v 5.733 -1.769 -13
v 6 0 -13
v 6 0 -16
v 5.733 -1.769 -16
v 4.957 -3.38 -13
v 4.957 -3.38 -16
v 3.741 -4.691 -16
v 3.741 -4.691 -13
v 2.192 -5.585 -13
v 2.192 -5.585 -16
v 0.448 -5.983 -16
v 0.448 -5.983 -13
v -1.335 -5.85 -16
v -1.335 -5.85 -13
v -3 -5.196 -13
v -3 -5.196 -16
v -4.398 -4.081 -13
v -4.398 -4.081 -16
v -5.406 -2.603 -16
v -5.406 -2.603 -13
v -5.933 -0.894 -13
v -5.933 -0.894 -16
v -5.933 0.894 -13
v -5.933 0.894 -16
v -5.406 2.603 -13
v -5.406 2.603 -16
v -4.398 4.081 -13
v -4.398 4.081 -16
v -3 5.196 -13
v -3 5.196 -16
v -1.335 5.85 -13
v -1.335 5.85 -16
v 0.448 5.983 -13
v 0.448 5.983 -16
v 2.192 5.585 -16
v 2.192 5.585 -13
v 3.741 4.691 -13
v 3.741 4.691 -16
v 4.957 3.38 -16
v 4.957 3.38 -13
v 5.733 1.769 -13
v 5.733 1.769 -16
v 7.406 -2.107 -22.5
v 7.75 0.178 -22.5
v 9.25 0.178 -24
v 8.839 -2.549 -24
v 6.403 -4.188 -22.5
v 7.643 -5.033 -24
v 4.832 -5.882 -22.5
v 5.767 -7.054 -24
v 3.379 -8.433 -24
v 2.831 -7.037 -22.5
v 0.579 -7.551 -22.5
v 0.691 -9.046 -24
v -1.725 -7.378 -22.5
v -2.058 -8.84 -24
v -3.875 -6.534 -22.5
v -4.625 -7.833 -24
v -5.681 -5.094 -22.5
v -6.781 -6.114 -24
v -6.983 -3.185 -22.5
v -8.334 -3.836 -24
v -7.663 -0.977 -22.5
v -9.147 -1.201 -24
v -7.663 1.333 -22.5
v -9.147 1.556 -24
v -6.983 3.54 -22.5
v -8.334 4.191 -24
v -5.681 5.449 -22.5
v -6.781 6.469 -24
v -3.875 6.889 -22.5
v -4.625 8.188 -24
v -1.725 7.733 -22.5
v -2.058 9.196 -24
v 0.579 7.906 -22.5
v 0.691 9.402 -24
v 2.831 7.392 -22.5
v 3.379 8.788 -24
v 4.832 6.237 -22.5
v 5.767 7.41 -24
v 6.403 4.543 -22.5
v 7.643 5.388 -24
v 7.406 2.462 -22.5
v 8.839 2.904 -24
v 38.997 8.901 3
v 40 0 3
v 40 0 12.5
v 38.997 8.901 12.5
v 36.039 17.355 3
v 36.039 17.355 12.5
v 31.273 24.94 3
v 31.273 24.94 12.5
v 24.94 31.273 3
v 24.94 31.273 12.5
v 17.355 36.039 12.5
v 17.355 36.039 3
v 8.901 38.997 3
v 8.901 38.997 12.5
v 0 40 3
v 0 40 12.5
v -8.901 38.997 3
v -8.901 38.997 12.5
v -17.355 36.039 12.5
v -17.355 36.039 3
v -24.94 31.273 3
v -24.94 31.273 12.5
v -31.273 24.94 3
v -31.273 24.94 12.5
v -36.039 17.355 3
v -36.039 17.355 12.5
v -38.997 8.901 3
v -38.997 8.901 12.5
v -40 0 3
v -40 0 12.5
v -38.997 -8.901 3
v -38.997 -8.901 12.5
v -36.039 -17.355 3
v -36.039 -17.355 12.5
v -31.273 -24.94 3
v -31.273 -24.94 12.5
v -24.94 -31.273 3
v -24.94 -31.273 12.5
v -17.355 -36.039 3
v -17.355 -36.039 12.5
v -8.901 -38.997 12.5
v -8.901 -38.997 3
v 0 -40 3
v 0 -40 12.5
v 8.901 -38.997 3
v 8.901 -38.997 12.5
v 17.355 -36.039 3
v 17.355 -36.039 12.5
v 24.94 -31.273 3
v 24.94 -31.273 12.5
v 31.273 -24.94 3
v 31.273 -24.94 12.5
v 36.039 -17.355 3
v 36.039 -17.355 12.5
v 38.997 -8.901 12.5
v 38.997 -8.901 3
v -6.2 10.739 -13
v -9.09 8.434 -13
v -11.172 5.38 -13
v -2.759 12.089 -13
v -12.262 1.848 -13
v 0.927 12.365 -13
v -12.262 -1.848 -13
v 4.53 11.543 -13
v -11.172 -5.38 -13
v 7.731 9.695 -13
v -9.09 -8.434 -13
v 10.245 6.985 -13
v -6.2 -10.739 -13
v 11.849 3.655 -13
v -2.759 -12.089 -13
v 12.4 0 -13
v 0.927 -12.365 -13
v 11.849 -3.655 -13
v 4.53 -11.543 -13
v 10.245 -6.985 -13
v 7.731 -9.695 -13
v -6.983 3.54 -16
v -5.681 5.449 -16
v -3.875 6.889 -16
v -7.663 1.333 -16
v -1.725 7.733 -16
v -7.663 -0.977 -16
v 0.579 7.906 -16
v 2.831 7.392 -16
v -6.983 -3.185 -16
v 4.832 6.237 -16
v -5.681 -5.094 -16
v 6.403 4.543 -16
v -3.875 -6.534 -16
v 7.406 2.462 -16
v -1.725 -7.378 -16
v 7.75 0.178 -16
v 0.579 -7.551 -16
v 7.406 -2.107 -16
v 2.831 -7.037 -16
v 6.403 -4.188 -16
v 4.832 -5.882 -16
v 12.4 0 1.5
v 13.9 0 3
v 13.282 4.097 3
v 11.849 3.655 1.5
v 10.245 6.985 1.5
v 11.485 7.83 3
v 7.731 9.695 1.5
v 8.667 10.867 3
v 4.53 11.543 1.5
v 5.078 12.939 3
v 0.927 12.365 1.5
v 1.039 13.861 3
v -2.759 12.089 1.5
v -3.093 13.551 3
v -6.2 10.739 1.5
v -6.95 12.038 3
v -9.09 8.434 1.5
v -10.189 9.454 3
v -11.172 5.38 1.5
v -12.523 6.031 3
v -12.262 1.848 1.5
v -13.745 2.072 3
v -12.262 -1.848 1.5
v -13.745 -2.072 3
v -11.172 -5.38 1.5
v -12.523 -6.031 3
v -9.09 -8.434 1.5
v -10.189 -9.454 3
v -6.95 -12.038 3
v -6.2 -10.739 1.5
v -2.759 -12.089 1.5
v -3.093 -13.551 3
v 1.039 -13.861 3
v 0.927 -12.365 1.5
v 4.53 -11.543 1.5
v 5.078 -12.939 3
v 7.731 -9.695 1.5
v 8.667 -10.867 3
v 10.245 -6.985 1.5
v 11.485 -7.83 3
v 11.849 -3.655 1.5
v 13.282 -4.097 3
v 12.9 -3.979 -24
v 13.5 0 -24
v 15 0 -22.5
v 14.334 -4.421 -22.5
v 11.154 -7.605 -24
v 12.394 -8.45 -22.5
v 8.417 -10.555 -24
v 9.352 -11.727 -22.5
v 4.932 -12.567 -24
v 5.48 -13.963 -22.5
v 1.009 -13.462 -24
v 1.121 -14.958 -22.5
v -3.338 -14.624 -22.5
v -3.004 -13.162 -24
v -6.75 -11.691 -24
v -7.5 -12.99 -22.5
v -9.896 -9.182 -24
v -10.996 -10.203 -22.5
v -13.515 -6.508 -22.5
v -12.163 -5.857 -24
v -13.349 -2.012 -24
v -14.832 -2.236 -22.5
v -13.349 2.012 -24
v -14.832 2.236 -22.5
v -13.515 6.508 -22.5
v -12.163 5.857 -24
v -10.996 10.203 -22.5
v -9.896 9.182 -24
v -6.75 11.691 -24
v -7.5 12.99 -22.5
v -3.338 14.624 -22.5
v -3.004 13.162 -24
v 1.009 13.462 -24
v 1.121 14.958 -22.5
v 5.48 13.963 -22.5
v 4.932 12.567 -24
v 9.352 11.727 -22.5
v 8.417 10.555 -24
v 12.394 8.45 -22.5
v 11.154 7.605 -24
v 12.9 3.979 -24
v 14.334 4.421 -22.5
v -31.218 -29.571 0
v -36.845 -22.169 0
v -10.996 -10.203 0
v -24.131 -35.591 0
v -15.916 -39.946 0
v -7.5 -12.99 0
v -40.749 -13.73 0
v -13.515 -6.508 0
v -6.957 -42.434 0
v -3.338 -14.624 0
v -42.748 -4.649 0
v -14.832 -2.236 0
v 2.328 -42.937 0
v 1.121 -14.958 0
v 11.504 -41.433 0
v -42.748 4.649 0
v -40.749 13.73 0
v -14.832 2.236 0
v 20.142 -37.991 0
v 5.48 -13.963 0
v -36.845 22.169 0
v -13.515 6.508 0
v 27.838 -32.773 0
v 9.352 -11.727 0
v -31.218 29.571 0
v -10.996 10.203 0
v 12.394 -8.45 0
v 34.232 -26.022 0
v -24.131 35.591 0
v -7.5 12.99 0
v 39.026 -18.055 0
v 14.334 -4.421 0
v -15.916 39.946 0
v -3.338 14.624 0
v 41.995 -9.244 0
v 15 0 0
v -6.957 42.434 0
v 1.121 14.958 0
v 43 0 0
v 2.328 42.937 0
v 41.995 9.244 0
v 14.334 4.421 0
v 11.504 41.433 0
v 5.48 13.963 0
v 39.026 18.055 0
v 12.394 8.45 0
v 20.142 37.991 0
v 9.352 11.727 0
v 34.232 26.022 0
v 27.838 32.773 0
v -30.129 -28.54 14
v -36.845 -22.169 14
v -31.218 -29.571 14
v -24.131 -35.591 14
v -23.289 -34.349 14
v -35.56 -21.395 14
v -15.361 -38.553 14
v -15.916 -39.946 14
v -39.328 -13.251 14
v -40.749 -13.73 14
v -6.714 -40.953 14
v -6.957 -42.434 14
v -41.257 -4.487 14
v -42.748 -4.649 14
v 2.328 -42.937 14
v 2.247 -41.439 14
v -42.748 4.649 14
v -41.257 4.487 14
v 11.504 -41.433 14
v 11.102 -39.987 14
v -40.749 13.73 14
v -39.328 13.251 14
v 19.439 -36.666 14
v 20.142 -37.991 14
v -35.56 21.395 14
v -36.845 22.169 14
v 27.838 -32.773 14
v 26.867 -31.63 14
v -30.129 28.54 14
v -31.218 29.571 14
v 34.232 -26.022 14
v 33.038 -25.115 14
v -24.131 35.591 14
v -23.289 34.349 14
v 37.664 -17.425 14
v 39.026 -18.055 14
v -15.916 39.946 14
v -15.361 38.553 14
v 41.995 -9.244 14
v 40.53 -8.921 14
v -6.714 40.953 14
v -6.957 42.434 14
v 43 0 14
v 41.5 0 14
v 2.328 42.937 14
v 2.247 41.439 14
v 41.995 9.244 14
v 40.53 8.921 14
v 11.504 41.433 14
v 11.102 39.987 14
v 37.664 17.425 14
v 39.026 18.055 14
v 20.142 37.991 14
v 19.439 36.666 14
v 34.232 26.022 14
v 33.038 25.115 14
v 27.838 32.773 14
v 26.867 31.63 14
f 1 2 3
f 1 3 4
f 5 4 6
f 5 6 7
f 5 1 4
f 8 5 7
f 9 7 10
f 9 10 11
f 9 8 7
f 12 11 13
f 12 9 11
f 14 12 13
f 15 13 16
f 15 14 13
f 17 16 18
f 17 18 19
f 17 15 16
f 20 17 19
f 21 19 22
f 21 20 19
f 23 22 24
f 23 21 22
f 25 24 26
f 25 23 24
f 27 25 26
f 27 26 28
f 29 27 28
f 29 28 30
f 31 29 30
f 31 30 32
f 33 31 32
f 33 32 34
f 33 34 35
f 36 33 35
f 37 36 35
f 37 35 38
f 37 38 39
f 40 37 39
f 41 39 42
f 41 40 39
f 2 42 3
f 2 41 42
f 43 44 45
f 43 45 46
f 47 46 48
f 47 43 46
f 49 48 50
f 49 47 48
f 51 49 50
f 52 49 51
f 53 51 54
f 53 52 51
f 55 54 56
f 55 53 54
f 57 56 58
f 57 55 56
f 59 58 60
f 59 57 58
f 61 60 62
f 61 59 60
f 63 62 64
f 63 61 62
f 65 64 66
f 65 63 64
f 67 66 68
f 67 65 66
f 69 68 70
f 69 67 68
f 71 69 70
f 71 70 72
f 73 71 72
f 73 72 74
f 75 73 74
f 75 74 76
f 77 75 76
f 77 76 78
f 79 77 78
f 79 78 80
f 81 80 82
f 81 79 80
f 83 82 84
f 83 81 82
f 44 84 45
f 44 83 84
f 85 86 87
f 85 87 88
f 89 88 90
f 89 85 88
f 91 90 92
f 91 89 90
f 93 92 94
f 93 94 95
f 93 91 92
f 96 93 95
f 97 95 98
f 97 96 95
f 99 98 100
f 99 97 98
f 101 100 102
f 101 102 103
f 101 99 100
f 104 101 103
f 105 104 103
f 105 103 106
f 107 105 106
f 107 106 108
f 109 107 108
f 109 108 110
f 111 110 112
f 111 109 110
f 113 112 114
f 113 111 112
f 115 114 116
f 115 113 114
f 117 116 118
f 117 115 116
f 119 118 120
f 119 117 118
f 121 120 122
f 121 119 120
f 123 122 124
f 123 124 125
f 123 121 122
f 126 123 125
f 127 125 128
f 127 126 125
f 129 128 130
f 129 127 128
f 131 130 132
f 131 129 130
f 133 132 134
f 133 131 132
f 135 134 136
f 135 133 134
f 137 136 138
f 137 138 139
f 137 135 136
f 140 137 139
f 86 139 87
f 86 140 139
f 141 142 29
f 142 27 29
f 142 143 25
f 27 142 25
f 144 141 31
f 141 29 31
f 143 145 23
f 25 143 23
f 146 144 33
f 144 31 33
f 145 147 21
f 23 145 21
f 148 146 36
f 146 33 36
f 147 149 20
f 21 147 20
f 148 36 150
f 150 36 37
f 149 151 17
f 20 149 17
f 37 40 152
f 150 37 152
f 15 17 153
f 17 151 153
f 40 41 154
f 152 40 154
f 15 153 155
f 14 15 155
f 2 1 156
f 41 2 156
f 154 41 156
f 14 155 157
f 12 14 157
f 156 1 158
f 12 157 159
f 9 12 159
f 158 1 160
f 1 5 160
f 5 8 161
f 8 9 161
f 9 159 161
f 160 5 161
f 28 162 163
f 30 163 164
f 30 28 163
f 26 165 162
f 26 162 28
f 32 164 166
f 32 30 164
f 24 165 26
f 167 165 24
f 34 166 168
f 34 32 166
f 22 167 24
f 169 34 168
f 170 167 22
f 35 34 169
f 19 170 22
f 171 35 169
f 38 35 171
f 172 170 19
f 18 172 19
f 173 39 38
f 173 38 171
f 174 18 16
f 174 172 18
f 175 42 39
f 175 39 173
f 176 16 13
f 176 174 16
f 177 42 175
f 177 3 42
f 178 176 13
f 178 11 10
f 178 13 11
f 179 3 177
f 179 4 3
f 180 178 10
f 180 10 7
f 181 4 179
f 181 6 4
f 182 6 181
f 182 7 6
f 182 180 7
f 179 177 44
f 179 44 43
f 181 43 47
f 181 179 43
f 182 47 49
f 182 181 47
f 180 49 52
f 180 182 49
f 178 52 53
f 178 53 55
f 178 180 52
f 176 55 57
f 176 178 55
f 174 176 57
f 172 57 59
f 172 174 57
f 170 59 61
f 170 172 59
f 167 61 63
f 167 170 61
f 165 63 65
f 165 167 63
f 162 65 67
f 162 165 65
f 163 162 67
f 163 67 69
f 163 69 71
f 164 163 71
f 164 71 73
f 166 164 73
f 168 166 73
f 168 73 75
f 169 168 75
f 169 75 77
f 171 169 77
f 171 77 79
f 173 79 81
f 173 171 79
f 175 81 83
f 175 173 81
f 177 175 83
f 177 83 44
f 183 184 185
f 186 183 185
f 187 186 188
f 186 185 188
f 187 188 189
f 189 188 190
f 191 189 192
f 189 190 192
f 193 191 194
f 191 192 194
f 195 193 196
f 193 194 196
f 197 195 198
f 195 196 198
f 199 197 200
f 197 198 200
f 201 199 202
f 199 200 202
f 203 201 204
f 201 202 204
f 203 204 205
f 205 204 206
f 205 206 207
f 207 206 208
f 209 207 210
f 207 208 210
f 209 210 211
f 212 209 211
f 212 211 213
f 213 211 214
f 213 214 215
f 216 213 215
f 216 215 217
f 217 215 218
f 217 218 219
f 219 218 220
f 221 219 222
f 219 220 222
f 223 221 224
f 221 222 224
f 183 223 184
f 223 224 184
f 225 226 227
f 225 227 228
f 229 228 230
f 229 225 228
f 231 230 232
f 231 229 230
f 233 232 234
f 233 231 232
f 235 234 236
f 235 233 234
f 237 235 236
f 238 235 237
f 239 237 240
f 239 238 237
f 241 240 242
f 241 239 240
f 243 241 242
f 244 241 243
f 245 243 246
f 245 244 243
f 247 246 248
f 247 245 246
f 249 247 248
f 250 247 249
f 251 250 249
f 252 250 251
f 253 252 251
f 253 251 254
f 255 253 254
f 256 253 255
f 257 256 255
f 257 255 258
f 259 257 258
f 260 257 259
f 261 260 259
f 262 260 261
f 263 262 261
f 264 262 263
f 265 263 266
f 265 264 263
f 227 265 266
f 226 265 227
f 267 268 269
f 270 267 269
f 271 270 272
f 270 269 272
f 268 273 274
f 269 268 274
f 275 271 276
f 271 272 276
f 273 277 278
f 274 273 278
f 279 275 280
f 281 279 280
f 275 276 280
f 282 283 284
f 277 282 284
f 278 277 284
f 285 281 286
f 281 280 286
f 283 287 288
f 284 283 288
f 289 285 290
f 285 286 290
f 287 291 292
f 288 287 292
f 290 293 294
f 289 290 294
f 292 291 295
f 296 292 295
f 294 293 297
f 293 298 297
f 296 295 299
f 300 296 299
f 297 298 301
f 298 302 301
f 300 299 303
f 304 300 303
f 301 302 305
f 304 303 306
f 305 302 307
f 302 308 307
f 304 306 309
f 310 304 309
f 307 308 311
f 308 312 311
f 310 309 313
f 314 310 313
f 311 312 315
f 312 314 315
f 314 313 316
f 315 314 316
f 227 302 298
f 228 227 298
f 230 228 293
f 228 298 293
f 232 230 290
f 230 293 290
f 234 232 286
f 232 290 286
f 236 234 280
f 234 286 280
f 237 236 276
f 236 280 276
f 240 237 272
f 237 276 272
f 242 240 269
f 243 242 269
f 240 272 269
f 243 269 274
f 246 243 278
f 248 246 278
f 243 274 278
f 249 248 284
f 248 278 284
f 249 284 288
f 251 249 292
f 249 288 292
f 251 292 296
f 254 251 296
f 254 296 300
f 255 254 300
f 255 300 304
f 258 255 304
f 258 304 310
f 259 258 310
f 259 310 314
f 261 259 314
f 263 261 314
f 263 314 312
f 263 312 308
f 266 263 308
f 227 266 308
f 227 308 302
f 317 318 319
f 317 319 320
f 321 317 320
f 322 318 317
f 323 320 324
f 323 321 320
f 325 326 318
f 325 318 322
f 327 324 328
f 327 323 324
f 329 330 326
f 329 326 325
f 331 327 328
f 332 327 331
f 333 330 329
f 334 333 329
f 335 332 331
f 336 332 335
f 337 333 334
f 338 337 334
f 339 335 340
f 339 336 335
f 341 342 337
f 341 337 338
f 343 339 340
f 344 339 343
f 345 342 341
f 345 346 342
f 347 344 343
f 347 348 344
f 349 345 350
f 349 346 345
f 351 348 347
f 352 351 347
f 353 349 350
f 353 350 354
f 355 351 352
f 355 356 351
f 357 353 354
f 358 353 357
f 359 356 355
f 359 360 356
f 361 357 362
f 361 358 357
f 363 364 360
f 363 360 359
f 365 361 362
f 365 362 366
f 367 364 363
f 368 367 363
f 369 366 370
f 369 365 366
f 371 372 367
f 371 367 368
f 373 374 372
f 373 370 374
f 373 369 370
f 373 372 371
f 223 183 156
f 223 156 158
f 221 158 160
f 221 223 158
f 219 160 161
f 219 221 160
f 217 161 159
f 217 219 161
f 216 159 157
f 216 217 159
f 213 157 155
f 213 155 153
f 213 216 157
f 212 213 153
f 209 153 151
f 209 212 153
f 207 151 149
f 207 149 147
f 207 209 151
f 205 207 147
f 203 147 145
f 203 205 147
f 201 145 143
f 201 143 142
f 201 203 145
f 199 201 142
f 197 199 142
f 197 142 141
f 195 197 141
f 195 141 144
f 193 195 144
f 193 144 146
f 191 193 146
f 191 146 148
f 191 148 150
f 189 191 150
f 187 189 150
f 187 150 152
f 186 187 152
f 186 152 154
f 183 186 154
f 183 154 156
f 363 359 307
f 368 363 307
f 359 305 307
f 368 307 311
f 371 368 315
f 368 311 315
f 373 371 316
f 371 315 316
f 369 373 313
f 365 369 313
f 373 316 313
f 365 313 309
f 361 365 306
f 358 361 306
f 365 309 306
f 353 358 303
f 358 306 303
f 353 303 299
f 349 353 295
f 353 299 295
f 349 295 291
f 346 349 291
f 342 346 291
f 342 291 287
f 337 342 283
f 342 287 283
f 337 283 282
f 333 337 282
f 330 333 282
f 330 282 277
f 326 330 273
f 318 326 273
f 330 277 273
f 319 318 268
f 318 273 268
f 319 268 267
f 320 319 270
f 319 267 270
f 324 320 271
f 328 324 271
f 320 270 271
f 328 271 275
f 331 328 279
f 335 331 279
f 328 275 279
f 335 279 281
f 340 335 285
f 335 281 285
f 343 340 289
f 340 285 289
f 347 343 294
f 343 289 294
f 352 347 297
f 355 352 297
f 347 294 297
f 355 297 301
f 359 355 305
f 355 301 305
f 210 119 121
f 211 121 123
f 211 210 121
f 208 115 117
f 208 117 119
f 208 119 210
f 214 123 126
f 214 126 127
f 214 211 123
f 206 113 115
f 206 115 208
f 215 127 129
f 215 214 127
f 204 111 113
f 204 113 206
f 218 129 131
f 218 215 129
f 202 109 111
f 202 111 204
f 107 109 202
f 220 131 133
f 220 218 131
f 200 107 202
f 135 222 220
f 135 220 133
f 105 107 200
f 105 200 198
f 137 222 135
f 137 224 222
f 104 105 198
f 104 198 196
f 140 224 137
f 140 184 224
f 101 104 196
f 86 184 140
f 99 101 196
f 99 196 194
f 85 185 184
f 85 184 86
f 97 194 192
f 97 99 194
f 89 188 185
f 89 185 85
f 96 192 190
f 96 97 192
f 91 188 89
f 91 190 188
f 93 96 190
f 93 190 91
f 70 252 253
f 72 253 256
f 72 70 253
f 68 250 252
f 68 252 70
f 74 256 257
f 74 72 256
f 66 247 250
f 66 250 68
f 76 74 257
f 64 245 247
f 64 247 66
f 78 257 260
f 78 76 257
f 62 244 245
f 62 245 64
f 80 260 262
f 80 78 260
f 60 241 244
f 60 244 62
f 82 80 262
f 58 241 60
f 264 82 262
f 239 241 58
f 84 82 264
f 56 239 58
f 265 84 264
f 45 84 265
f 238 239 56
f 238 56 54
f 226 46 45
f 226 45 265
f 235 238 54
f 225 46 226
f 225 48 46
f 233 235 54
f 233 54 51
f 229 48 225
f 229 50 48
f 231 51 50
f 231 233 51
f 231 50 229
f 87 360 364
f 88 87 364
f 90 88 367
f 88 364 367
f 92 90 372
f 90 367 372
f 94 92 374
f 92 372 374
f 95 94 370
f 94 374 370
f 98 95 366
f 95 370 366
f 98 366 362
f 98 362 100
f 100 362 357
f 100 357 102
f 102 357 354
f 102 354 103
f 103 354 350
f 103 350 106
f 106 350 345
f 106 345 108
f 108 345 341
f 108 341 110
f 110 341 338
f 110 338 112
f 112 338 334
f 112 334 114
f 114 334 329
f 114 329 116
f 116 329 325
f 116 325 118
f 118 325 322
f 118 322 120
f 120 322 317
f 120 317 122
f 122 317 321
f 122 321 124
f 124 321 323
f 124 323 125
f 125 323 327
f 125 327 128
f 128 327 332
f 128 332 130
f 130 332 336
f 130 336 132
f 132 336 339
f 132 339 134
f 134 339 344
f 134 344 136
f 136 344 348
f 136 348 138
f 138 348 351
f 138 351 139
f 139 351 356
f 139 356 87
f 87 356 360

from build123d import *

# Parameters (mm, degrees)
SKETCH_R        = 43
PAD_DEPTH       = 3
SKETCH001_R     = 43
SKETCH001_R_2   = 40
PAD001_DEPTH    = 11
SKETCH002_R     = 12.4
POCKET_DEPTH    = 5
SKETCH003_R     = 15
SKETCH003_R_2   = 12.4
PAD002_DEPTH    = 13
SKETCH004_R     = 15
SKETCH004_R_2   = 6
PAD003_DEPTH    = 3
SKETCH005_R     = 15
SKETCH005_R_2   = 7.75
PAD004_DEPTH    = 8
CHAMFER_SIZE    = 1.5
CHAMFER001_SIZE = 1.5
CHAMFER002_SIZE = 1.5
CHAMFER003_SIZE = 1.5


with BuildPart() as part:
    # Sketch → Pad (new body)
    with BuildSketch(Plane.XY):
        Circle(SKETCH_R)
    extrude(amount=PAD_DEPTH)

    # Sketch001 (on Face3 of Pad) → Pad001 (join)
    with BuildSketch(Plane.XY.offset(3)):
        Circle(SKETCH001_R)
        Circle(SKETCH001_R_2, mode=Mode.SUBTRACT)
    extrude(amount=PAD001_DEPTH)

    # Sketch002 (on Face6 of Pad001) → Pocket (cut)
    with BuildSketch(Plane.XY.offset(3)):
        Circle(SKETCH002_R)
    extrude(amount=-POCKET_DEPTH, mode=Mode.SUBTRACT)

    # Sketch003 (on Face2 of Pocket) → Pad002 (join)
    with BuildSketch(Plane(origin=(0, 0, 0), x_dir=(1, 0, 0), z_dir=(0, 0, -1))):
        Circle(SKETCH003_R)
        Circle(SKETCH003_R_2, mode=Mode.SUBTRACT)
    extrude(amount=PAD002_DEPTH)

    # Sketch004 (on Face6 of Pad002) → Pad003 (join)
    with BuildSketch(Plane(origin=(0, 0, -13), x_dir=(1, 0, 0), z_dir=(0, 0, -1))):
        Circle(SKETCH004_R)
        Circle(SKETCH004_R_2, mode=Mode.SUBTRACT)
    extrude(amount=PAD003_DEPTH)

    # Sketch005 (on Face8 of Pad003) → Pad004 (join)
    with BuildSketch(Plane(origin=(0, 0, -16), x_dir=(1, 0, 0), z_dir=(0, 0, -1))):
        Circle(SKETCH005_R)
        with Locations((0, -0.177664)):
            Circle(SKETCH005_R_2, mode=Mode.SUBTRACT)
    extrude(amount=PAD004_DEPTH)

    # Chamfer
    chamfer_edges = [part.edges().sort_by_distance(p)[0] for p in [
        (-15, 0, -24),
    ]]
    chamfer(chamfer_edges, length=CHAMFER_SIZE)

    # Chamfer001
    chamfer001_edges = [part.edges().sort_by_distance(p)[0] for p in [
        (-7.75, 0.177664, -24),
    ]]
    chamfer(chamfer001_edges, length=CHAMFER001_SIZE)

    # Chamfer002
    chamfer002_edges = [part.edges().sort_by_distance(p)[0] for p in [
        (-12.4, 0, 3),
    ]]
    chamfer(chamfer002_edges, length=CHAMFER002_SIZE)

    # Chamfer003
    chamfer003_edges = [part.edges().sort_by_distance(p)[0] for p in [
        (-40, 0, 14),
    ]]
    chamfer(chamfer003_edges, length=CHAMFER003_SIZE)


solid = part.part
